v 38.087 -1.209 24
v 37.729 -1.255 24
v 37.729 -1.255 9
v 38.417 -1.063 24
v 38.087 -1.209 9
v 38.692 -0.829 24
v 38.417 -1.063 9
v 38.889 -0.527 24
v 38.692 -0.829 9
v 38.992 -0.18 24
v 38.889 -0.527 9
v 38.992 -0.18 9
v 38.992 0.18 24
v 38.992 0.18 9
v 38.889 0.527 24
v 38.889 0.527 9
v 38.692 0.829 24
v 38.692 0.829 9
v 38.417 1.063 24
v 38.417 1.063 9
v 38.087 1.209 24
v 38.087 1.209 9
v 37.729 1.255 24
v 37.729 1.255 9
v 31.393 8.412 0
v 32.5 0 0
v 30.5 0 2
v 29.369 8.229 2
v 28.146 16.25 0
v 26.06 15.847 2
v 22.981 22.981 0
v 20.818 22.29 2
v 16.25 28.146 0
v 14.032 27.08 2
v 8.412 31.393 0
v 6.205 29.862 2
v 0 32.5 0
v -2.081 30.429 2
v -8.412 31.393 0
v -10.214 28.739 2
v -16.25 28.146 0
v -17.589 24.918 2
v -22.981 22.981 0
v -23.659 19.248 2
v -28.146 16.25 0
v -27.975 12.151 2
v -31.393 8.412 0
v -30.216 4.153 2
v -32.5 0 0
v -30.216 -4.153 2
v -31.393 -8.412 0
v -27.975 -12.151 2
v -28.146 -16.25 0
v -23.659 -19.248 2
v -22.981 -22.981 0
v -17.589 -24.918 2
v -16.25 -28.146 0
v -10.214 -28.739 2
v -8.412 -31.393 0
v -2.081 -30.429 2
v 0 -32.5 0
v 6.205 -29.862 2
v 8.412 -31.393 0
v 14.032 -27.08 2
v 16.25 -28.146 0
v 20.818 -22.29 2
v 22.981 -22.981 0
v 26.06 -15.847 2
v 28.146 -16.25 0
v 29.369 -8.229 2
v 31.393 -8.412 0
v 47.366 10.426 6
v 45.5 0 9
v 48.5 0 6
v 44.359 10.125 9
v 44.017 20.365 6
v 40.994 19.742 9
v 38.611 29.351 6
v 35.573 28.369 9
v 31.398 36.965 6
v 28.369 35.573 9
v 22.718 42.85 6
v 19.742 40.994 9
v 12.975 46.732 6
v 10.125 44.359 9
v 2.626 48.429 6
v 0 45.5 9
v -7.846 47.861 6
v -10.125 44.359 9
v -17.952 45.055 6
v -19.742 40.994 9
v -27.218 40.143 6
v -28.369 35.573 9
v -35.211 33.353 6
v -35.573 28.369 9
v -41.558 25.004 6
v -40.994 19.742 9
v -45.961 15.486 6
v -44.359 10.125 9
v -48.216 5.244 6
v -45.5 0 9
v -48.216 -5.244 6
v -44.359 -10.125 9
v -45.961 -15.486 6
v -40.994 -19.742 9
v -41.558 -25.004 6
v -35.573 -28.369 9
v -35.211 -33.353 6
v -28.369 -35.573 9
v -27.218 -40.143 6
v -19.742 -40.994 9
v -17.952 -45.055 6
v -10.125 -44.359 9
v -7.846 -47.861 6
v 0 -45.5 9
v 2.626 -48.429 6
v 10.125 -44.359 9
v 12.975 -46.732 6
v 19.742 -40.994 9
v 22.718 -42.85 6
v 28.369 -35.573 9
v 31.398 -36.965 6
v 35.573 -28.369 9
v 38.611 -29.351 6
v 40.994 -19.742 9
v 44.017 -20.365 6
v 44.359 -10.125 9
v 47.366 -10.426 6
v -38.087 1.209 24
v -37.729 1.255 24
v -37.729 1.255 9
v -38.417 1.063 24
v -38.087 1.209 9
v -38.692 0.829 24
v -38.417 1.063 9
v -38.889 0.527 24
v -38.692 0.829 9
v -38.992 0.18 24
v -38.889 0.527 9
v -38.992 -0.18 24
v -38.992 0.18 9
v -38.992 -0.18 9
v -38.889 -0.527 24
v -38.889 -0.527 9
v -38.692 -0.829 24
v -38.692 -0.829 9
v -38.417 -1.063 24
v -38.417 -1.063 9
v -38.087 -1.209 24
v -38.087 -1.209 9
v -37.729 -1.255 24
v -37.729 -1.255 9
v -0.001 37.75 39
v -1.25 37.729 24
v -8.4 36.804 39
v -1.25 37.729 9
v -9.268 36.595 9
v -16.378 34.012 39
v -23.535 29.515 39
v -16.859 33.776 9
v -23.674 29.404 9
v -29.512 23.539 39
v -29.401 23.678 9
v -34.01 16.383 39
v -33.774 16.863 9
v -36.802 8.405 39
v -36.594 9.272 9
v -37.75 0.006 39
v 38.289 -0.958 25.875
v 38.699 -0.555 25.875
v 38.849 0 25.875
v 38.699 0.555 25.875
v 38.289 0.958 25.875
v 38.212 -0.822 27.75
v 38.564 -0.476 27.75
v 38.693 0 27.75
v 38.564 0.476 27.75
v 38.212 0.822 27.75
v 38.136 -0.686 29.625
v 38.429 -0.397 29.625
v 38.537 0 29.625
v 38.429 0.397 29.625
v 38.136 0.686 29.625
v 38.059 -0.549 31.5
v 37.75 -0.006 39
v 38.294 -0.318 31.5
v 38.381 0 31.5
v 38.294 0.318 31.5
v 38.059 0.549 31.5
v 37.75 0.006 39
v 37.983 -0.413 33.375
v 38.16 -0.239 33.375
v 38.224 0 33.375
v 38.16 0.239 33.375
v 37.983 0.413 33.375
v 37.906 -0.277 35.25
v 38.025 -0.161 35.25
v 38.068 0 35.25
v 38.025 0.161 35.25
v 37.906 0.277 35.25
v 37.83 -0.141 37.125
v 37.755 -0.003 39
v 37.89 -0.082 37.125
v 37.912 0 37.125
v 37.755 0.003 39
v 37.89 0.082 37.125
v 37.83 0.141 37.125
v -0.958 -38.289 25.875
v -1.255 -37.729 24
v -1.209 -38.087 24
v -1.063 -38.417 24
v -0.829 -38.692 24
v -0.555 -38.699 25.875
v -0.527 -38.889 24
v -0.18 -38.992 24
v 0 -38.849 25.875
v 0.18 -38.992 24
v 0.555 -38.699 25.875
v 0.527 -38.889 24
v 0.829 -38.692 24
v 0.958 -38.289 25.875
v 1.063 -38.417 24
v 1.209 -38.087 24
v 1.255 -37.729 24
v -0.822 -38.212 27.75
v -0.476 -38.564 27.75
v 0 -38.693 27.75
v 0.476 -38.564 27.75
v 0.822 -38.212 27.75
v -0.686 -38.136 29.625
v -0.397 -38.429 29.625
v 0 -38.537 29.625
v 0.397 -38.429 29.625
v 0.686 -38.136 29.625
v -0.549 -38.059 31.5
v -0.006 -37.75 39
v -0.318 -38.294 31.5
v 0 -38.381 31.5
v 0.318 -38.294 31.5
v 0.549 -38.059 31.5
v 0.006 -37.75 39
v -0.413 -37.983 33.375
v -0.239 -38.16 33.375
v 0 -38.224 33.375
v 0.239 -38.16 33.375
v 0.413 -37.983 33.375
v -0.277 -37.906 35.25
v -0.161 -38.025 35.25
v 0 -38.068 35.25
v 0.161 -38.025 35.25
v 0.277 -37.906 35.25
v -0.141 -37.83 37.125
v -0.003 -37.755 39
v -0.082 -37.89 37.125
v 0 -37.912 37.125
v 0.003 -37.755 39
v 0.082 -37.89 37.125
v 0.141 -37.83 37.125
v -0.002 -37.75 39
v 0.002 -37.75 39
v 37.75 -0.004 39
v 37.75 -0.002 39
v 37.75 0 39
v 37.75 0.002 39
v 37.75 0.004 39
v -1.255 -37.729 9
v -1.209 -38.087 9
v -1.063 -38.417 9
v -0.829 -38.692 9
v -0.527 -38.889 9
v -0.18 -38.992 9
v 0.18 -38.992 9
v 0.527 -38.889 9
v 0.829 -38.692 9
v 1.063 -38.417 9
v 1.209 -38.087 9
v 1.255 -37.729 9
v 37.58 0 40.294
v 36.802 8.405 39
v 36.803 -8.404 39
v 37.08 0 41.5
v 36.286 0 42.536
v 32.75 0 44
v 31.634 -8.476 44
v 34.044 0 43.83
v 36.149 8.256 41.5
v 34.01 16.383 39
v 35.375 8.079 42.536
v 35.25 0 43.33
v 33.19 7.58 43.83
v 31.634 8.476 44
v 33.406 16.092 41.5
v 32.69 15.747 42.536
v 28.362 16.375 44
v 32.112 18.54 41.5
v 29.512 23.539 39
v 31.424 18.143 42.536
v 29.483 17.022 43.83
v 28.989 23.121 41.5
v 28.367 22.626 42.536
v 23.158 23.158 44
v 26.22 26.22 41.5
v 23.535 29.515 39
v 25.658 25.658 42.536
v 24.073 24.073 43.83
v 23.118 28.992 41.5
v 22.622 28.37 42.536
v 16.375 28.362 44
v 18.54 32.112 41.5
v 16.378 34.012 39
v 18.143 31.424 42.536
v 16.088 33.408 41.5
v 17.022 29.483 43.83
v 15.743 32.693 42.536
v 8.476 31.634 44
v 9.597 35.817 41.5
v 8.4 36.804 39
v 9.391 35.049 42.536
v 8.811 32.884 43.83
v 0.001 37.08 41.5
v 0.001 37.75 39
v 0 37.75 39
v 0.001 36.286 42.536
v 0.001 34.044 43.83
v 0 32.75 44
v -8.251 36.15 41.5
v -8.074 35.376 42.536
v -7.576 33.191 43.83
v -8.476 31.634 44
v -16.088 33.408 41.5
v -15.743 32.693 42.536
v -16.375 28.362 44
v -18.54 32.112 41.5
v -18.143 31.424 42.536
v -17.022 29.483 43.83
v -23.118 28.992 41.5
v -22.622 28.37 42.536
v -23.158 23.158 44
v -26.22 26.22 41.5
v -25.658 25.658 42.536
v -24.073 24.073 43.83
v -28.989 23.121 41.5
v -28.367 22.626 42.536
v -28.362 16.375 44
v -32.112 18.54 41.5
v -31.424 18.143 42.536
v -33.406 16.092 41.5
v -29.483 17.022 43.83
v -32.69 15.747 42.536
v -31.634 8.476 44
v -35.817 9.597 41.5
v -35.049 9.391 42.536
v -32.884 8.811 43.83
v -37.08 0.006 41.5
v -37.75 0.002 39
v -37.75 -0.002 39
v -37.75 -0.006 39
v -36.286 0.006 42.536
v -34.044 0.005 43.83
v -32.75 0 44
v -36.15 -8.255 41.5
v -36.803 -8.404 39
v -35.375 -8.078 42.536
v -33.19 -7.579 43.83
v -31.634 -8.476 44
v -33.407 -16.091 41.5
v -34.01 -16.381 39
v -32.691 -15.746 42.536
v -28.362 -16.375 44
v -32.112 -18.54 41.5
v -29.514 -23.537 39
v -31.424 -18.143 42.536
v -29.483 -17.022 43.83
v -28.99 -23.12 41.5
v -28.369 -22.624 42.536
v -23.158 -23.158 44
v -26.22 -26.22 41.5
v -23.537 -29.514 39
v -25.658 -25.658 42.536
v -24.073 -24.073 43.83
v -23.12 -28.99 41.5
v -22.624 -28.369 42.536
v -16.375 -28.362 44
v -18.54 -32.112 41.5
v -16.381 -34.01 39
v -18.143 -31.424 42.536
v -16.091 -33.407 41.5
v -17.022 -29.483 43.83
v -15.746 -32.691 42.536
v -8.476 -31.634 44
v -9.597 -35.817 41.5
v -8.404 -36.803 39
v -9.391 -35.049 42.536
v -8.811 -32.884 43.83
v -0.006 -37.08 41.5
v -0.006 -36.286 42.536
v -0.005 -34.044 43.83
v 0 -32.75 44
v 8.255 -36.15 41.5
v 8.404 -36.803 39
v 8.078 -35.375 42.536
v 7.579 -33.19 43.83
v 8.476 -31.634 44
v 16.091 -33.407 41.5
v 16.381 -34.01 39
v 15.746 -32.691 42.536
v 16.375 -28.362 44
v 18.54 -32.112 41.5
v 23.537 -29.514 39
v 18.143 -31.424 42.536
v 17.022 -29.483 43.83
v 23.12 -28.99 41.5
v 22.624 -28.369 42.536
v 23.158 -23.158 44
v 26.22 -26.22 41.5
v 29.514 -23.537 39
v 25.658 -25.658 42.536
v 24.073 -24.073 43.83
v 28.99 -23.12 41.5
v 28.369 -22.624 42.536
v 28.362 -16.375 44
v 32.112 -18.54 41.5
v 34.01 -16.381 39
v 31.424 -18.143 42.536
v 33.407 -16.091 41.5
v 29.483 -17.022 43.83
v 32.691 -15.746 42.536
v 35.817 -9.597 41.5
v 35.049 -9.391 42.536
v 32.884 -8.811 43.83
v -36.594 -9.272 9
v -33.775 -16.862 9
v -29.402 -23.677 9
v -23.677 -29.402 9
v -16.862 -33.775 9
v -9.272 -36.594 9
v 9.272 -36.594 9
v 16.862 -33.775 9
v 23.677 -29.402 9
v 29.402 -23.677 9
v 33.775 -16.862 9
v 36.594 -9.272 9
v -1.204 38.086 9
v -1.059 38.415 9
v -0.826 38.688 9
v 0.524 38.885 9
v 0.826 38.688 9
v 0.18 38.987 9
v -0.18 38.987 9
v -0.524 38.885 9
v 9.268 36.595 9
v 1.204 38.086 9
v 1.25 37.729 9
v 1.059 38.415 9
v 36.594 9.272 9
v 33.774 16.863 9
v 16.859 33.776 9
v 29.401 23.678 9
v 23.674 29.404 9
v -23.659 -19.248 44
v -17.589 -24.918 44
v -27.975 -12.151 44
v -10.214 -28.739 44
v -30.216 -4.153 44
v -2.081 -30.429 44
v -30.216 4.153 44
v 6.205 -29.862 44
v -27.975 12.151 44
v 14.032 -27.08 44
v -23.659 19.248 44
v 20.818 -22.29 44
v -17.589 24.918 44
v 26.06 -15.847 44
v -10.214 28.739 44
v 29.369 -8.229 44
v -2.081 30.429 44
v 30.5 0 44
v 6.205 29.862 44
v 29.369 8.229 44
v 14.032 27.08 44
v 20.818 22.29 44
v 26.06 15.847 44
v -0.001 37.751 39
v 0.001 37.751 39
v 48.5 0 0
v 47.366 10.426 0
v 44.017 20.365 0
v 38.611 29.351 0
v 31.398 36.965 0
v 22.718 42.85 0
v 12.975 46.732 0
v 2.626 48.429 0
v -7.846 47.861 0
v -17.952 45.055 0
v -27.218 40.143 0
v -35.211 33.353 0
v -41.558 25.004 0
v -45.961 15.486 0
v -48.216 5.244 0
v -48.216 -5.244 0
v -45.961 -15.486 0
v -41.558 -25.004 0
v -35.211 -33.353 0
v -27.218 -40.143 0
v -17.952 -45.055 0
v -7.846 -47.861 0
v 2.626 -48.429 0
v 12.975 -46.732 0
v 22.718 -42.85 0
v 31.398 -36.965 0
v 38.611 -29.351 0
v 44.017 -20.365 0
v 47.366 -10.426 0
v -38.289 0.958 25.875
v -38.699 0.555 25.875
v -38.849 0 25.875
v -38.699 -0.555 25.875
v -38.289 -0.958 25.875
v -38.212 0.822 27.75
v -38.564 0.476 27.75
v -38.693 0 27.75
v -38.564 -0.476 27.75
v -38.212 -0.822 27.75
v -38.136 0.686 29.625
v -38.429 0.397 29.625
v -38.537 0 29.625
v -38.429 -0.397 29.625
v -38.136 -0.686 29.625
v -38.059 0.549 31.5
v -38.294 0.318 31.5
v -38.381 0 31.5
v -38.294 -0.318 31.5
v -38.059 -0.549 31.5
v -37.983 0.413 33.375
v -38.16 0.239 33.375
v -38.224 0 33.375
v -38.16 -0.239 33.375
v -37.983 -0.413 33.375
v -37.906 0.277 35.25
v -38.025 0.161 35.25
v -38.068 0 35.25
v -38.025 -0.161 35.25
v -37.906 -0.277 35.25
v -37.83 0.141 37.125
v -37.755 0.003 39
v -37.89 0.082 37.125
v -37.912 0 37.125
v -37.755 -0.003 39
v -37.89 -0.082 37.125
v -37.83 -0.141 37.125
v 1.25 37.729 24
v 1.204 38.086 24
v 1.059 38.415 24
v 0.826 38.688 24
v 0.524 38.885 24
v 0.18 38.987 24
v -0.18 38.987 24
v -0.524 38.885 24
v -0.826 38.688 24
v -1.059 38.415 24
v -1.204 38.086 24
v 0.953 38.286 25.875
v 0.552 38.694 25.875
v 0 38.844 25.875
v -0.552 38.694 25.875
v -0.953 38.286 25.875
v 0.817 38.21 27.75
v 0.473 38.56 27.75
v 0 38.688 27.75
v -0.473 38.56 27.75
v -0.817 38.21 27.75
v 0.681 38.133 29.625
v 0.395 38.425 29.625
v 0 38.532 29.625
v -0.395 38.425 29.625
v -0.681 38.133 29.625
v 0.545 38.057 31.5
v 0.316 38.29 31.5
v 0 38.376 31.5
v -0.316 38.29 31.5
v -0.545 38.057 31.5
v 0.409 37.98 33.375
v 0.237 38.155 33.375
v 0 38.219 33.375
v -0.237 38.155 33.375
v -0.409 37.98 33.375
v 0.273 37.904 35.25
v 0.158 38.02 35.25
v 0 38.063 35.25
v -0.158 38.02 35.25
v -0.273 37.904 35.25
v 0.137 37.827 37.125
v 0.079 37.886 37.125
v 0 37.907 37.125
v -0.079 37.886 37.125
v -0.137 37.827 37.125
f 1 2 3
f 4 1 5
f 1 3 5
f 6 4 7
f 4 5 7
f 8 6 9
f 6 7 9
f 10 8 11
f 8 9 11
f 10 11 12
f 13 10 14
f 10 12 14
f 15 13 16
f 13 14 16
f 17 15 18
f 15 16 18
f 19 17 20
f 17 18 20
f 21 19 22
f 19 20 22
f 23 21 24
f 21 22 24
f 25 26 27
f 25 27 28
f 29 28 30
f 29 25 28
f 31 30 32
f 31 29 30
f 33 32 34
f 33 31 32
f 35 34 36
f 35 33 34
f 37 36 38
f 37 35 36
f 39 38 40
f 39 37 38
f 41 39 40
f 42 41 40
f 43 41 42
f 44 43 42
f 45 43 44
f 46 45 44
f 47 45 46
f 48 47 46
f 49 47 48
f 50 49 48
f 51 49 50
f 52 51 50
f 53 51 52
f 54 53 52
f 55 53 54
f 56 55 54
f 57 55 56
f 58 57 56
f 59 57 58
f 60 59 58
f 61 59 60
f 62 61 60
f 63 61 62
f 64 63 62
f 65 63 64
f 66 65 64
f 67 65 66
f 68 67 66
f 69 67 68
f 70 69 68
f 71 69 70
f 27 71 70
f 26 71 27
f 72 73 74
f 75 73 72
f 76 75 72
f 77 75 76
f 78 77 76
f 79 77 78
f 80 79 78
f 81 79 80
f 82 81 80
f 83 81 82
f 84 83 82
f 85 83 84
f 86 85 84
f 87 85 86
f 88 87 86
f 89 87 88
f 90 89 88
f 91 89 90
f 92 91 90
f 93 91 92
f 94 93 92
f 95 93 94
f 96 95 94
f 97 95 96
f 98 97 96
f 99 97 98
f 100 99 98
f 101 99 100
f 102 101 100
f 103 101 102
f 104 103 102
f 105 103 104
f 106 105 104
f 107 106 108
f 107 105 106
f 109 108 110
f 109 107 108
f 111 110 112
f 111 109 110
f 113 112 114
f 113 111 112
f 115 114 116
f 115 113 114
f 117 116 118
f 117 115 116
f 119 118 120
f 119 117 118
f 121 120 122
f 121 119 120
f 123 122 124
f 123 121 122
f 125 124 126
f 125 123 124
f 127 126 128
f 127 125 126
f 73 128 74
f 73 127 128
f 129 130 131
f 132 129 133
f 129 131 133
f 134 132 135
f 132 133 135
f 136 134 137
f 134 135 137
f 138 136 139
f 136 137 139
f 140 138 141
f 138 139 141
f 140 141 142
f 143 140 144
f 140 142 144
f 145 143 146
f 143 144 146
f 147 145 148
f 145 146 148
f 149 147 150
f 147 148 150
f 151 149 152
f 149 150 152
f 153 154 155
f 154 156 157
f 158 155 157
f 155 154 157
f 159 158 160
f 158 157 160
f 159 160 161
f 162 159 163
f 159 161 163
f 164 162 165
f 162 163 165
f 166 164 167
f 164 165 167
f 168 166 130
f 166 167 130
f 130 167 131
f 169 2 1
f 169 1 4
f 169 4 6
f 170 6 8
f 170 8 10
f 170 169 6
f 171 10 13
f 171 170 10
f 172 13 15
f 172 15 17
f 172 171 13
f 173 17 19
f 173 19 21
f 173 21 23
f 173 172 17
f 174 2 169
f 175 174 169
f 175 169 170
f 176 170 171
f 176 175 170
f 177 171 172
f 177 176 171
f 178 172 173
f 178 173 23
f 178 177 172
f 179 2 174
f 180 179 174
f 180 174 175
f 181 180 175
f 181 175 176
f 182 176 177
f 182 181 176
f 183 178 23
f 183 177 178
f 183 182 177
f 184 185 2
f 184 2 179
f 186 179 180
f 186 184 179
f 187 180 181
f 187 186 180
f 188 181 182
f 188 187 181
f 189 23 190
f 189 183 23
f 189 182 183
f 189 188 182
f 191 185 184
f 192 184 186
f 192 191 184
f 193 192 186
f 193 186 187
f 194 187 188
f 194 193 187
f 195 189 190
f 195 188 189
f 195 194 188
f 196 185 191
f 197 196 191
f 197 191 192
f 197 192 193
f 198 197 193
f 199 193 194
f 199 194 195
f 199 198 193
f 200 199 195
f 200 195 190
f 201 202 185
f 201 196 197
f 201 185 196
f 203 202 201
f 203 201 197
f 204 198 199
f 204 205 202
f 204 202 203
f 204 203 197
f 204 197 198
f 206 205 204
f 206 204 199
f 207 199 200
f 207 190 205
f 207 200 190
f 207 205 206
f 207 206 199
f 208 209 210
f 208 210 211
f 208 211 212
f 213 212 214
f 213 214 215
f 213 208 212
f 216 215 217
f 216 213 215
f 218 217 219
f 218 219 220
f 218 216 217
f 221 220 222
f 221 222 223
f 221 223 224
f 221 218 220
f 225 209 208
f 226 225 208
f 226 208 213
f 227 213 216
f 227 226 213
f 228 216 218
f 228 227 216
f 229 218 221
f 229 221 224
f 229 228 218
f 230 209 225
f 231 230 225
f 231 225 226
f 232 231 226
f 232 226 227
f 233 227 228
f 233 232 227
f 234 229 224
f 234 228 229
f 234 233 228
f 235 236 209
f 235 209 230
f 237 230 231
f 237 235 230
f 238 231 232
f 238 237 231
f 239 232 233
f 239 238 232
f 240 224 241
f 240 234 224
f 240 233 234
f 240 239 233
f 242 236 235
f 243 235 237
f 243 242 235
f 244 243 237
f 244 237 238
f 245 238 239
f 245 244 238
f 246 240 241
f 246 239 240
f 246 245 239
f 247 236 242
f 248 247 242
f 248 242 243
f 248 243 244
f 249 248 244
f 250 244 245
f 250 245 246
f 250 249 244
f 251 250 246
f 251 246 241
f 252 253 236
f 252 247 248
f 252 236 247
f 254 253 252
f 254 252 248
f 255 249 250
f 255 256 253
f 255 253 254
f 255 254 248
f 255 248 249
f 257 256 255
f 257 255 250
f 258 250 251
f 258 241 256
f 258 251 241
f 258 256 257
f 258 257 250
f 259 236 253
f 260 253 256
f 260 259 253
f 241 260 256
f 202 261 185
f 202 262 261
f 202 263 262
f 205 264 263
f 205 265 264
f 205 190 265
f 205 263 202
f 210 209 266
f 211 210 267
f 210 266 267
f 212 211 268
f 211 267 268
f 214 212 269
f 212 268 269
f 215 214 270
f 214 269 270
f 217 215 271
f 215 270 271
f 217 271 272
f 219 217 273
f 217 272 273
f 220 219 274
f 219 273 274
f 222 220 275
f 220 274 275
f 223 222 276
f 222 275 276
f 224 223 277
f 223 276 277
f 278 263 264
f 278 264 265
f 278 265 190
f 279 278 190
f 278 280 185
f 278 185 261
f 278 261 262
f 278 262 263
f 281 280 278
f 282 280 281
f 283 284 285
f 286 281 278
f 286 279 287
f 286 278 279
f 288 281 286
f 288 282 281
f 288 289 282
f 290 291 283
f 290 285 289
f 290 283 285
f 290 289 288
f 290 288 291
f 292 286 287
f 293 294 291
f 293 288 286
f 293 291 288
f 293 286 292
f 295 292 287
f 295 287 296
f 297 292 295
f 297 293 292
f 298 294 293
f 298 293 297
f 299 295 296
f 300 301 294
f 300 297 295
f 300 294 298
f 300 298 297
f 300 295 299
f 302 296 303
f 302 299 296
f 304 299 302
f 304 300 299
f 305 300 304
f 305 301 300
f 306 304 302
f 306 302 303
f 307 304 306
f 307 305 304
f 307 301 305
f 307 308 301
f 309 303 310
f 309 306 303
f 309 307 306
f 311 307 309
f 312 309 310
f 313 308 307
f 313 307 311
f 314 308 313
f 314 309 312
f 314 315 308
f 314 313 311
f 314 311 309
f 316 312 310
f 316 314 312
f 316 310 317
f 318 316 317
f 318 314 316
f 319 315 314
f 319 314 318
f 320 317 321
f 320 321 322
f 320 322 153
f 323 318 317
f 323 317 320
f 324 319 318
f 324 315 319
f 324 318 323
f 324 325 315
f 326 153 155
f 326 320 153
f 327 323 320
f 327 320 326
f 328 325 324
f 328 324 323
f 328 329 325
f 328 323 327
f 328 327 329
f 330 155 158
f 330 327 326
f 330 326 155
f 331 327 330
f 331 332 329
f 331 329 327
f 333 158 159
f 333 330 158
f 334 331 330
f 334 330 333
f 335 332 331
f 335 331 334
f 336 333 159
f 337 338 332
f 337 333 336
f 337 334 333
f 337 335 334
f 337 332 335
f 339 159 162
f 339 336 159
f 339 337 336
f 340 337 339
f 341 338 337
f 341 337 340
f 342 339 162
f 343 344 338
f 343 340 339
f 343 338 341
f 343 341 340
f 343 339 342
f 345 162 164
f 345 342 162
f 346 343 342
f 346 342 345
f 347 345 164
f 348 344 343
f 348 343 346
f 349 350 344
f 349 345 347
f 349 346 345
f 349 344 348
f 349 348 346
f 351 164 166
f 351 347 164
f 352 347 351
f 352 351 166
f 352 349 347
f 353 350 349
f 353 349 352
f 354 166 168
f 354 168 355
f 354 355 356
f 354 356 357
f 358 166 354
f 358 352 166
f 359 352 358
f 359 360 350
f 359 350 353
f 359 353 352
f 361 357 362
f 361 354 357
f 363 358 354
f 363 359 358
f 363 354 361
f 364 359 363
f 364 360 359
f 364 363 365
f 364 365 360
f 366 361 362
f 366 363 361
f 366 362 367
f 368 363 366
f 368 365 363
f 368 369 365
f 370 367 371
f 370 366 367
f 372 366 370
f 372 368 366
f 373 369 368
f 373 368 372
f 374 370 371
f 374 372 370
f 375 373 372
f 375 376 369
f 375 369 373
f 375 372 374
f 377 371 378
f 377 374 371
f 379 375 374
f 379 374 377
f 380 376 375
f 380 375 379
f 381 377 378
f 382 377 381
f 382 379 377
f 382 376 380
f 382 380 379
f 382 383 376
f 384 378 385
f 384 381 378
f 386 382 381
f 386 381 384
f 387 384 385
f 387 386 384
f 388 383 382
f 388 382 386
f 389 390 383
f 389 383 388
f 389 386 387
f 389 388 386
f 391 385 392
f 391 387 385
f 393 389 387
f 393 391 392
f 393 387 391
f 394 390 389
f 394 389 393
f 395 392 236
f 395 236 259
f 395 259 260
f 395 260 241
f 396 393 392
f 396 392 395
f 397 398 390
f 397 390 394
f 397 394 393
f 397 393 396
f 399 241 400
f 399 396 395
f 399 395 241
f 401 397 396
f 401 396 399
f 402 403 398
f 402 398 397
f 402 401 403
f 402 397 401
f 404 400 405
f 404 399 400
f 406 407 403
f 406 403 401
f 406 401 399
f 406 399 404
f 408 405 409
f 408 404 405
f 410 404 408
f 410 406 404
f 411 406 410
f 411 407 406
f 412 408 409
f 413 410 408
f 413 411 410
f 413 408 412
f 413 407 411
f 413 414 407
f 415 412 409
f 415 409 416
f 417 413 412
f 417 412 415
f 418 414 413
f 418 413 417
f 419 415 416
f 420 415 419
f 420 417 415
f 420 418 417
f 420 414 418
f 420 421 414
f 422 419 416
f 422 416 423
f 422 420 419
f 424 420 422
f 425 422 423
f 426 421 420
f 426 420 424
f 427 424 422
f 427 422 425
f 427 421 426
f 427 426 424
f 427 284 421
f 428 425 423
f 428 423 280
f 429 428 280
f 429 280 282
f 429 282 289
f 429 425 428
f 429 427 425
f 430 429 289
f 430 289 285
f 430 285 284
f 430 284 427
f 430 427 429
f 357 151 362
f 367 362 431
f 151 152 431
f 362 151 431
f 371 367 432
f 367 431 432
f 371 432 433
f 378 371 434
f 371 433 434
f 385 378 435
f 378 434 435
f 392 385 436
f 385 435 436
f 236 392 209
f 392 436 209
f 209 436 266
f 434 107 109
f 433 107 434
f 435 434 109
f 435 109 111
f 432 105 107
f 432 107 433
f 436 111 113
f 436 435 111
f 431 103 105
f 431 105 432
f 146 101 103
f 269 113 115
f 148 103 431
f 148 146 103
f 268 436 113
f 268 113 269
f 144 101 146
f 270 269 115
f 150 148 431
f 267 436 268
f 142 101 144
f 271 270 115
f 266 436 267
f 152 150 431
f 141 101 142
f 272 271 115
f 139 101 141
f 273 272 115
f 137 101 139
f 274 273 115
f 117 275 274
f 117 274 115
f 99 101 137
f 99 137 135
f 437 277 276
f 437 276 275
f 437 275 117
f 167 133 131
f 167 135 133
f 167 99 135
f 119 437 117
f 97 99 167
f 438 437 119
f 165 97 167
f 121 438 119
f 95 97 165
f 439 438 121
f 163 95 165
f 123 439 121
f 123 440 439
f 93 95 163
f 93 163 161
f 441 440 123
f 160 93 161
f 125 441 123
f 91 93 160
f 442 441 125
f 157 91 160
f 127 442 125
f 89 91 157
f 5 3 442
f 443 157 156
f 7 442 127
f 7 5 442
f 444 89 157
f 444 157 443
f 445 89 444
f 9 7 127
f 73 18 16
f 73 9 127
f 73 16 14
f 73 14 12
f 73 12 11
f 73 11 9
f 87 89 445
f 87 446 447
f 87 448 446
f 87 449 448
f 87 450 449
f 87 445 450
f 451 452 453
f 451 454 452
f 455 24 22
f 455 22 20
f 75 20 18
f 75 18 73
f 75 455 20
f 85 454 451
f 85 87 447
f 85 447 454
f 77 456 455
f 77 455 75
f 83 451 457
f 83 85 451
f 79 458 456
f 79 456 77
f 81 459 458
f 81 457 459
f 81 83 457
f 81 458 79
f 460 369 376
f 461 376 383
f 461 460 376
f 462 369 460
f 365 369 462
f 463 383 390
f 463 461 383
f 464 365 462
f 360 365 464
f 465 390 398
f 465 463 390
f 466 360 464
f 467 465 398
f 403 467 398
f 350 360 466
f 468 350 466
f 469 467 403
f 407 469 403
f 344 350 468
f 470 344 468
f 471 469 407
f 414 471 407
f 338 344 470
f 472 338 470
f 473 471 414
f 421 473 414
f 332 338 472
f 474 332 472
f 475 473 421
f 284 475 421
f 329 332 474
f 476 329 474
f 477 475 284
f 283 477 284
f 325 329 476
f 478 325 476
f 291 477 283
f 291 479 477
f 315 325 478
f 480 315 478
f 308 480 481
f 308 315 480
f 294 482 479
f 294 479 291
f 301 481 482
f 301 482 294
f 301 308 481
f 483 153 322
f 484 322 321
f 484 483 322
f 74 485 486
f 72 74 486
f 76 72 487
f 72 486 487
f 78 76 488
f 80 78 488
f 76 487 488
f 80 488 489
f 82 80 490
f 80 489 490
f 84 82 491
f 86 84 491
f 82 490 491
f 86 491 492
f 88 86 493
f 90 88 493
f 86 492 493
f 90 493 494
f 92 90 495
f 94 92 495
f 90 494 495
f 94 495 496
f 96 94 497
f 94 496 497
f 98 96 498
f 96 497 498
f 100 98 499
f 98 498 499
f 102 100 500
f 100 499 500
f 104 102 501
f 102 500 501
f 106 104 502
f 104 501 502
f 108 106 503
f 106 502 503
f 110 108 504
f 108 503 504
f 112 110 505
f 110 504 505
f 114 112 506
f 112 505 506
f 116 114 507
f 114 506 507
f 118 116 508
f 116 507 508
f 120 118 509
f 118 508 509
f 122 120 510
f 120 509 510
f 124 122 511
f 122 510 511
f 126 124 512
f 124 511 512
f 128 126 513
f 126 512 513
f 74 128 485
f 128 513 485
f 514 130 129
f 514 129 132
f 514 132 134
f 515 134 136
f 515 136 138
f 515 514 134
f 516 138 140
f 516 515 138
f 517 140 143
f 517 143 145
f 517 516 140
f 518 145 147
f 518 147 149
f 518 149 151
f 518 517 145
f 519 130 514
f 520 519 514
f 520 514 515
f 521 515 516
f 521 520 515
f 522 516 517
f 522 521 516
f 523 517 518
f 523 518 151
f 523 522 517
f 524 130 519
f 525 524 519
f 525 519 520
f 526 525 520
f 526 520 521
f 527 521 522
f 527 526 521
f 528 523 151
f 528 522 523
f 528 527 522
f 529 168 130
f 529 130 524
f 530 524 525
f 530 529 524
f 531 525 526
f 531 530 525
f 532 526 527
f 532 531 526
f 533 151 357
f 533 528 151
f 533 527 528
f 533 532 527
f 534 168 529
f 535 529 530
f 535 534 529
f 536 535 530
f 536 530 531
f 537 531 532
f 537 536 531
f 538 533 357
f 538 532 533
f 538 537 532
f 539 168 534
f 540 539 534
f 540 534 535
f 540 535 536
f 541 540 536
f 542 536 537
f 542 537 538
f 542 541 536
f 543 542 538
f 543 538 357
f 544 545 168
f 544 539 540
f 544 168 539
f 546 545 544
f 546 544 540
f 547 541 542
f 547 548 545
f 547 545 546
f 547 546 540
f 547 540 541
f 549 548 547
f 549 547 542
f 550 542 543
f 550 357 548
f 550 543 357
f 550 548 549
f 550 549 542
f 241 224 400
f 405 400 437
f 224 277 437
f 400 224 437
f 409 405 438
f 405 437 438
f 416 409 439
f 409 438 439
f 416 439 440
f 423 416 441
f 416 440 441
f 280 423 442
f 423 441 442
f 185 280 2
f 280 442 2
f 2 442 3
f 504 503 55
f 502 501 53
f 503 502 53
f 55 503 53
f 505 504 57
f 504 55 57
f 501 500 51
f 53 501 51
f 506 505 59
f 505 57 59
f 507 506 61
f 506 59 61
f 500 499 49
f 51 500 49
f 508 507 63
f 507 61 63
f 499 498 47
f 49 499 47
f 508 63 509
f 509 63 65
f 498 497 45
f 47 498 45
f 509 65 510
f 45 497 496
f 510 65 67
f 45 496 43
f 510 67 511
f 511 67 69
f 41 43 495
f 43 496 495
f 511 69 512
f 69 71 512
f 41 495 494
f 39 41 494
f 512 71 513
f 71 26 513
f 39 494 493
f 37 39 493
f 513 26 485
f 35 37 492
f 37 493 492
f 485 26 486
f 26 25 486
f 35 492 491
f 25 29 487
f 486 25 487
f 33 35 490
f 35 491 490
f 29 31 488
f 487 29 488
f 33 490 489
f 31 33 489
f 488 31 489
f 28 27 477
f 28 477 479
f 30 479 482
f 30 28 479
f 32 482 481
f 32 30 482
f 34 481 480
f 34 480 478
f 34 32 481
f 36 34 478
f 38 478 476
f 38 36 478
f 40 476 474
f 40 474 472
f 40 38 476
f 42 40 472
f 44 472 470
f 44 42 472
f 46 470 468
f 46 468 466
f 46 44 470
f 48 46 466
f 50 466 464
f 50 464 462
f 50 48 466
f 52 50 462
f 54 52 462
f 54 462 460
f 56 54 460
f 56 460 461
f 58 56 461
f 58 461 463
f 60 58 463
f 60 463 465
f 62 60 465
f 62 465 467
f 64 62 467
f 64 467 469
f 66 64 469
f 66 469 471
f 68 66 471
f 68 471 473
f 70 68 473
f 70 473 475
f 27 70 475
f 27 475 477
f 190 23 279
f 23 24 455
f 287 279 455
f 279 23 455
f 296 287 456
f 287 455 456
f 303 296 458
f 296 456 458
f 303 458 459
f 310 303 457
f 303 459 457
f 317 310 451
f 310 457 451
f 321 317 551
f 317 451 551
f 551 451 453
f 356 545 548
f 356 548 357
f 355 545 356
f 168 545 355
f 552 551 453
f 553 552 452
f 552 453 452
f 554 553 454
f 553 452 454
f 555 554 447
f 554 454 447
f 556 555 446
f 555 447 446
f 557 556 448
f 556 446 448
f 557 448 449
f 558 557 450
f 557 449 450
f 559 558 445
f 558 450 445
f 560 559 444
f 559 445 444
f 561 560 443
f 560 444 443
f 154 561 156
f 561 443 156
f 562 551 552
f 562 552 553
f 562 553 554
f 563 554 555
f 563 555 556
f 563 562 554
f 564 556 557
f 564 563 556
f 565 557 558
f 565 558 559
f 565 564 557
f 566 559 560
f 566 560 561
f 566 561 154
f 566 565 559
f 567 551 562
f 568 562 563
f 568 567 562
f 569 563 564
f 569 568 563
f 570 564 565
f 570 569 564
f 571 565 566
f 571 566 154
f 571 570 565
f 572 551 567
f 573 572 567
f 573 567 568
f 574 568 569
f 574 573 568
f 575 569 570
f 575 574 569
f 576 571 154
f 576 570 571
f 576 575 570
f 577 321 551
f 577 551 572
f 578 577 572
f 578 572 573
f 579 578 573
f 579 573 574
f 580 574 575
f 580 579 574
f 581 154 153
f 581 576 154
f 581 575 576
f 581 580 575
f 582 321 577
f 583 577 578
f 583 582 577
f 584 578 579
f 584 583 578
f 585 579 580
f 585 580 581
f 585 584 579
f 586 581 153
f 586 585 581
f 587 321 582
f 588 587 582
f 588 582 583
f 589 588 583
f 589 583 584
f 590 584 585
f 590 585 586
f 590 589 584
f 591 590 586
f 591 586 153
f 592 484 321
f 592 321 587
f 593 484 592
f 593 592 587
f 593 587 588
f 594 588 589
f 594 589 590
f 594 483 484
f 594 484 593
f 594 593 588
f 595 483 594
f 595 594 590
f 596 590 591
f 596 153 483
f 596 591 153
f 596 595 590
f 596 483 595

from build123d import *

# Parameters (mm, degrees)
F0_R         = 48.5
F0_R_2       = 30.5
F1_DEPTH     = 9
F2_R         = 37.75
F2_R_2       = 30.5
F3_DEPTH     = 35
F4_R         = 5
F5_R         = 1.25
F5_R_2       = 1.255
F6_DEPTH     = 30
F7_T4_ANGLE  = 359.64
F7_S5_R      = 37.75
F7_T6_DEPTH  = 9
F7_T10_ANGLE = 359.64
F7_S11_R     = 37.75
F7_T12_DEPTH = 9
F7_T16_ANGLE = 359.64
F7_S17_R     = 37.75
F7_T18_DEPTH = 9
F7_T22_ANGLE = 359.64
F7_S23_R     = 37.75
F7_T24_DEPTH = 9
F8_SIZE      = 2
F9_SIZE      = 3


# Not quite as in the source:
# - a fillet or chamfer that OpenCascade refuses, or shapes differently, is made with other operations: its cross-section is extruded or revolved along the edge and cut away or added


with BuildPart() as f1:
    # F0 (on Top) → F1 (new body)
    with BuildSketch(Plane.XY):
        Circle(F0_R)
        Circle(F0_R_2, mode=Mode.SUBTRACT)
    extrude(amount=F1_DEPTH)

    # F2 (on face) → F3 (join)
    with BuildSketch(Plane.XY.offset(9)):
        Circle(F2_R)
        Circle(F2_R_2, mode=Mode.SUBTRACT)
    extrude(amount=F3_DEPTH)

    # F4
    f4_edges = [f1.edges().sort_by_distance(p)[0] for p in [
        (-37.75, 0, 44),
    ]]
    fillet(f4_edges, radius=F4_R)

    # F5 (on face) → F6 (join)
    with BuildSketch(Plane.XY.offset(9)):
        with Locations((0, 37.75)):
            Circle(F5_R)
        with Locations((-37.75, 0)):
            Circle(F5_R_2)
        with Locations((0, -37.75)):
            Circle(F5_R_2)
        with Locations((37.75, 0)):
            Circle(F5_R_2)
    extrude(amount=F6_DEPTH)

    # F7: chamfer of 1.249 x 15 on 4 edges, made by hand


with BuildPart() as f7_tool2:
    # F7_s3 → F7_t4 (revolve)
    with BuildSketch(Plane(origin=(-0.0003725763, 0.1185943423, 0), x_dir=(0, 0, 1), z_dir=(0.0031415875, -0.9999950652, 0))):
        Polygon((24, 36.4948137114), (39, 37.7438137114), (39, 36.4948137114), align=None)
    revolve(axis=Axis((-37.75, 0, 39), (0, 0, 1)), revolution_arc=F7_T4_ANGLE)

    # F7_s5 → F7_t6 (cut, symmetric)
    with BuildSketch(Plane.XY.offset(31.5)):
        Circle(F7_S5_R)
    extrude(amount=F7_T6_DEPTH, both=True, mode=Mode.SUBTRACT)


with BuildPart() as f1_1:
    add(f1.part)

    # F7_t1: cut F7_tool2
    add(f7_tool2.part, mode=Mode.SUBTRACT)


with BuildPart() as f7_tool8:
    # F7_s9 → F7_t10 (revolve)
    with BuildSketch(Plane(origin=(0.1185943423, 0.0003725763, 0), x_dir=(0, 0, 1), z_dir=(-0.9999950652, -0.0031415875, 0))):
        Polygon((24, 36.4998137114), (39, 37.7488137114), (39, 36.4998137114), align=None)
    revolve(axis=Axis((0, 37.75, 39), (0, 0, 1)), revolution_arc=F7_T10_ANGLE)

    # F7_s11 → F7_t12 (cut, symmetric)
    with BuildSketch(Plane.XY.offset(31.5)):
        Circle(F7_S11_R)
    extrude(amount=F7_T12_DEPTH, both=True, mode=Mode.SUBTRACT)


with BuildPart() as f1_2:
    add(f1_1.part)

    # F7_t7: cut F7_tool8
    add(f7_tool8.part, mode=Mode.SUBTRACT)


with BuildPart() as f7_tool14:
    # F7_s15 → F7_t16 (revolve)
    with BuildSketch(Plane(origin=(-0.1185943423, -0.0003725763, 0), x_dir=(0, 0, 1), z_dir=(0.9999950652, 0.0031415875, 0))):
        Polygon((24, 36.4948137114), (39, 37.7438137114), (39, 36.4948137114), align=None)
    revolve(axis=Axis((0, -37.75, 39), (0, 0, 1)), revolution_arc=F7_T16_ANGLE)

    # F7_s17 → F7_t18 (cut, symmetric)
    with BuildSketch(Plane.XY.offset(31.5)):
        Circle(F7_S17_R)
    extrude(amount=F7_T18_DEPTH, both=True, mode=Mode.SUBTRACT)


with BuildPart() as f1_3:
    add(f1_2.part)

    # F7_t13: cut F7_tool14
    add(f7_tool14.part, mode=Mode.SUBTRACT)


with BuildPart() as f7_tool20:
    # F7_s21 → F7_t22 (revolve)
    with BuildSketch(Plane(origin=(0.0003725763, -0.1185943423, 0), x_dir=(0, 0, 1), z_dir=(-0.0031415875, 0.9999950652, 0))):
        Polygon((24, 36.4948137114), (39, 37.7438137114), (39, 36.4948137114), align=None)
    revolve(axis=Axis((37.75, 0, 39), (0, 0, 1)), revolution_arc=F7_T22_ANGLE)

    # F7_s23 → F7_t24 (cut, symmetric)
    with BuildSketch(Plane.XY.offset(31.5)):
        Circle(F7_S23_R)
    extrude(amount=F7_T24_DEPTH, both=True, mode=Mode.SUBTRACT)


with BuildPart() as f1_4:
    add(f1_3.part)

    # F7_t19: cut F7_tool20
    add(f7_tool20.part, mode=Mode.SUBTRACT)

    # F8
    f8_edges = [f1_4.edges().sort_by_distance(p)[0] for p in [
        (-30.5, 0, 0),
    ]]
    chamfer(f8_edges, length=F8_SIZE)

    # F9
    f9_edges = [f1_4.edges().sort_by_distance(p)[0] for p in [
        (-48.5, 0, 9),
    ]]
    chamfer(f9_edges, length=F9_SIZE)


solid = f1_4.part
